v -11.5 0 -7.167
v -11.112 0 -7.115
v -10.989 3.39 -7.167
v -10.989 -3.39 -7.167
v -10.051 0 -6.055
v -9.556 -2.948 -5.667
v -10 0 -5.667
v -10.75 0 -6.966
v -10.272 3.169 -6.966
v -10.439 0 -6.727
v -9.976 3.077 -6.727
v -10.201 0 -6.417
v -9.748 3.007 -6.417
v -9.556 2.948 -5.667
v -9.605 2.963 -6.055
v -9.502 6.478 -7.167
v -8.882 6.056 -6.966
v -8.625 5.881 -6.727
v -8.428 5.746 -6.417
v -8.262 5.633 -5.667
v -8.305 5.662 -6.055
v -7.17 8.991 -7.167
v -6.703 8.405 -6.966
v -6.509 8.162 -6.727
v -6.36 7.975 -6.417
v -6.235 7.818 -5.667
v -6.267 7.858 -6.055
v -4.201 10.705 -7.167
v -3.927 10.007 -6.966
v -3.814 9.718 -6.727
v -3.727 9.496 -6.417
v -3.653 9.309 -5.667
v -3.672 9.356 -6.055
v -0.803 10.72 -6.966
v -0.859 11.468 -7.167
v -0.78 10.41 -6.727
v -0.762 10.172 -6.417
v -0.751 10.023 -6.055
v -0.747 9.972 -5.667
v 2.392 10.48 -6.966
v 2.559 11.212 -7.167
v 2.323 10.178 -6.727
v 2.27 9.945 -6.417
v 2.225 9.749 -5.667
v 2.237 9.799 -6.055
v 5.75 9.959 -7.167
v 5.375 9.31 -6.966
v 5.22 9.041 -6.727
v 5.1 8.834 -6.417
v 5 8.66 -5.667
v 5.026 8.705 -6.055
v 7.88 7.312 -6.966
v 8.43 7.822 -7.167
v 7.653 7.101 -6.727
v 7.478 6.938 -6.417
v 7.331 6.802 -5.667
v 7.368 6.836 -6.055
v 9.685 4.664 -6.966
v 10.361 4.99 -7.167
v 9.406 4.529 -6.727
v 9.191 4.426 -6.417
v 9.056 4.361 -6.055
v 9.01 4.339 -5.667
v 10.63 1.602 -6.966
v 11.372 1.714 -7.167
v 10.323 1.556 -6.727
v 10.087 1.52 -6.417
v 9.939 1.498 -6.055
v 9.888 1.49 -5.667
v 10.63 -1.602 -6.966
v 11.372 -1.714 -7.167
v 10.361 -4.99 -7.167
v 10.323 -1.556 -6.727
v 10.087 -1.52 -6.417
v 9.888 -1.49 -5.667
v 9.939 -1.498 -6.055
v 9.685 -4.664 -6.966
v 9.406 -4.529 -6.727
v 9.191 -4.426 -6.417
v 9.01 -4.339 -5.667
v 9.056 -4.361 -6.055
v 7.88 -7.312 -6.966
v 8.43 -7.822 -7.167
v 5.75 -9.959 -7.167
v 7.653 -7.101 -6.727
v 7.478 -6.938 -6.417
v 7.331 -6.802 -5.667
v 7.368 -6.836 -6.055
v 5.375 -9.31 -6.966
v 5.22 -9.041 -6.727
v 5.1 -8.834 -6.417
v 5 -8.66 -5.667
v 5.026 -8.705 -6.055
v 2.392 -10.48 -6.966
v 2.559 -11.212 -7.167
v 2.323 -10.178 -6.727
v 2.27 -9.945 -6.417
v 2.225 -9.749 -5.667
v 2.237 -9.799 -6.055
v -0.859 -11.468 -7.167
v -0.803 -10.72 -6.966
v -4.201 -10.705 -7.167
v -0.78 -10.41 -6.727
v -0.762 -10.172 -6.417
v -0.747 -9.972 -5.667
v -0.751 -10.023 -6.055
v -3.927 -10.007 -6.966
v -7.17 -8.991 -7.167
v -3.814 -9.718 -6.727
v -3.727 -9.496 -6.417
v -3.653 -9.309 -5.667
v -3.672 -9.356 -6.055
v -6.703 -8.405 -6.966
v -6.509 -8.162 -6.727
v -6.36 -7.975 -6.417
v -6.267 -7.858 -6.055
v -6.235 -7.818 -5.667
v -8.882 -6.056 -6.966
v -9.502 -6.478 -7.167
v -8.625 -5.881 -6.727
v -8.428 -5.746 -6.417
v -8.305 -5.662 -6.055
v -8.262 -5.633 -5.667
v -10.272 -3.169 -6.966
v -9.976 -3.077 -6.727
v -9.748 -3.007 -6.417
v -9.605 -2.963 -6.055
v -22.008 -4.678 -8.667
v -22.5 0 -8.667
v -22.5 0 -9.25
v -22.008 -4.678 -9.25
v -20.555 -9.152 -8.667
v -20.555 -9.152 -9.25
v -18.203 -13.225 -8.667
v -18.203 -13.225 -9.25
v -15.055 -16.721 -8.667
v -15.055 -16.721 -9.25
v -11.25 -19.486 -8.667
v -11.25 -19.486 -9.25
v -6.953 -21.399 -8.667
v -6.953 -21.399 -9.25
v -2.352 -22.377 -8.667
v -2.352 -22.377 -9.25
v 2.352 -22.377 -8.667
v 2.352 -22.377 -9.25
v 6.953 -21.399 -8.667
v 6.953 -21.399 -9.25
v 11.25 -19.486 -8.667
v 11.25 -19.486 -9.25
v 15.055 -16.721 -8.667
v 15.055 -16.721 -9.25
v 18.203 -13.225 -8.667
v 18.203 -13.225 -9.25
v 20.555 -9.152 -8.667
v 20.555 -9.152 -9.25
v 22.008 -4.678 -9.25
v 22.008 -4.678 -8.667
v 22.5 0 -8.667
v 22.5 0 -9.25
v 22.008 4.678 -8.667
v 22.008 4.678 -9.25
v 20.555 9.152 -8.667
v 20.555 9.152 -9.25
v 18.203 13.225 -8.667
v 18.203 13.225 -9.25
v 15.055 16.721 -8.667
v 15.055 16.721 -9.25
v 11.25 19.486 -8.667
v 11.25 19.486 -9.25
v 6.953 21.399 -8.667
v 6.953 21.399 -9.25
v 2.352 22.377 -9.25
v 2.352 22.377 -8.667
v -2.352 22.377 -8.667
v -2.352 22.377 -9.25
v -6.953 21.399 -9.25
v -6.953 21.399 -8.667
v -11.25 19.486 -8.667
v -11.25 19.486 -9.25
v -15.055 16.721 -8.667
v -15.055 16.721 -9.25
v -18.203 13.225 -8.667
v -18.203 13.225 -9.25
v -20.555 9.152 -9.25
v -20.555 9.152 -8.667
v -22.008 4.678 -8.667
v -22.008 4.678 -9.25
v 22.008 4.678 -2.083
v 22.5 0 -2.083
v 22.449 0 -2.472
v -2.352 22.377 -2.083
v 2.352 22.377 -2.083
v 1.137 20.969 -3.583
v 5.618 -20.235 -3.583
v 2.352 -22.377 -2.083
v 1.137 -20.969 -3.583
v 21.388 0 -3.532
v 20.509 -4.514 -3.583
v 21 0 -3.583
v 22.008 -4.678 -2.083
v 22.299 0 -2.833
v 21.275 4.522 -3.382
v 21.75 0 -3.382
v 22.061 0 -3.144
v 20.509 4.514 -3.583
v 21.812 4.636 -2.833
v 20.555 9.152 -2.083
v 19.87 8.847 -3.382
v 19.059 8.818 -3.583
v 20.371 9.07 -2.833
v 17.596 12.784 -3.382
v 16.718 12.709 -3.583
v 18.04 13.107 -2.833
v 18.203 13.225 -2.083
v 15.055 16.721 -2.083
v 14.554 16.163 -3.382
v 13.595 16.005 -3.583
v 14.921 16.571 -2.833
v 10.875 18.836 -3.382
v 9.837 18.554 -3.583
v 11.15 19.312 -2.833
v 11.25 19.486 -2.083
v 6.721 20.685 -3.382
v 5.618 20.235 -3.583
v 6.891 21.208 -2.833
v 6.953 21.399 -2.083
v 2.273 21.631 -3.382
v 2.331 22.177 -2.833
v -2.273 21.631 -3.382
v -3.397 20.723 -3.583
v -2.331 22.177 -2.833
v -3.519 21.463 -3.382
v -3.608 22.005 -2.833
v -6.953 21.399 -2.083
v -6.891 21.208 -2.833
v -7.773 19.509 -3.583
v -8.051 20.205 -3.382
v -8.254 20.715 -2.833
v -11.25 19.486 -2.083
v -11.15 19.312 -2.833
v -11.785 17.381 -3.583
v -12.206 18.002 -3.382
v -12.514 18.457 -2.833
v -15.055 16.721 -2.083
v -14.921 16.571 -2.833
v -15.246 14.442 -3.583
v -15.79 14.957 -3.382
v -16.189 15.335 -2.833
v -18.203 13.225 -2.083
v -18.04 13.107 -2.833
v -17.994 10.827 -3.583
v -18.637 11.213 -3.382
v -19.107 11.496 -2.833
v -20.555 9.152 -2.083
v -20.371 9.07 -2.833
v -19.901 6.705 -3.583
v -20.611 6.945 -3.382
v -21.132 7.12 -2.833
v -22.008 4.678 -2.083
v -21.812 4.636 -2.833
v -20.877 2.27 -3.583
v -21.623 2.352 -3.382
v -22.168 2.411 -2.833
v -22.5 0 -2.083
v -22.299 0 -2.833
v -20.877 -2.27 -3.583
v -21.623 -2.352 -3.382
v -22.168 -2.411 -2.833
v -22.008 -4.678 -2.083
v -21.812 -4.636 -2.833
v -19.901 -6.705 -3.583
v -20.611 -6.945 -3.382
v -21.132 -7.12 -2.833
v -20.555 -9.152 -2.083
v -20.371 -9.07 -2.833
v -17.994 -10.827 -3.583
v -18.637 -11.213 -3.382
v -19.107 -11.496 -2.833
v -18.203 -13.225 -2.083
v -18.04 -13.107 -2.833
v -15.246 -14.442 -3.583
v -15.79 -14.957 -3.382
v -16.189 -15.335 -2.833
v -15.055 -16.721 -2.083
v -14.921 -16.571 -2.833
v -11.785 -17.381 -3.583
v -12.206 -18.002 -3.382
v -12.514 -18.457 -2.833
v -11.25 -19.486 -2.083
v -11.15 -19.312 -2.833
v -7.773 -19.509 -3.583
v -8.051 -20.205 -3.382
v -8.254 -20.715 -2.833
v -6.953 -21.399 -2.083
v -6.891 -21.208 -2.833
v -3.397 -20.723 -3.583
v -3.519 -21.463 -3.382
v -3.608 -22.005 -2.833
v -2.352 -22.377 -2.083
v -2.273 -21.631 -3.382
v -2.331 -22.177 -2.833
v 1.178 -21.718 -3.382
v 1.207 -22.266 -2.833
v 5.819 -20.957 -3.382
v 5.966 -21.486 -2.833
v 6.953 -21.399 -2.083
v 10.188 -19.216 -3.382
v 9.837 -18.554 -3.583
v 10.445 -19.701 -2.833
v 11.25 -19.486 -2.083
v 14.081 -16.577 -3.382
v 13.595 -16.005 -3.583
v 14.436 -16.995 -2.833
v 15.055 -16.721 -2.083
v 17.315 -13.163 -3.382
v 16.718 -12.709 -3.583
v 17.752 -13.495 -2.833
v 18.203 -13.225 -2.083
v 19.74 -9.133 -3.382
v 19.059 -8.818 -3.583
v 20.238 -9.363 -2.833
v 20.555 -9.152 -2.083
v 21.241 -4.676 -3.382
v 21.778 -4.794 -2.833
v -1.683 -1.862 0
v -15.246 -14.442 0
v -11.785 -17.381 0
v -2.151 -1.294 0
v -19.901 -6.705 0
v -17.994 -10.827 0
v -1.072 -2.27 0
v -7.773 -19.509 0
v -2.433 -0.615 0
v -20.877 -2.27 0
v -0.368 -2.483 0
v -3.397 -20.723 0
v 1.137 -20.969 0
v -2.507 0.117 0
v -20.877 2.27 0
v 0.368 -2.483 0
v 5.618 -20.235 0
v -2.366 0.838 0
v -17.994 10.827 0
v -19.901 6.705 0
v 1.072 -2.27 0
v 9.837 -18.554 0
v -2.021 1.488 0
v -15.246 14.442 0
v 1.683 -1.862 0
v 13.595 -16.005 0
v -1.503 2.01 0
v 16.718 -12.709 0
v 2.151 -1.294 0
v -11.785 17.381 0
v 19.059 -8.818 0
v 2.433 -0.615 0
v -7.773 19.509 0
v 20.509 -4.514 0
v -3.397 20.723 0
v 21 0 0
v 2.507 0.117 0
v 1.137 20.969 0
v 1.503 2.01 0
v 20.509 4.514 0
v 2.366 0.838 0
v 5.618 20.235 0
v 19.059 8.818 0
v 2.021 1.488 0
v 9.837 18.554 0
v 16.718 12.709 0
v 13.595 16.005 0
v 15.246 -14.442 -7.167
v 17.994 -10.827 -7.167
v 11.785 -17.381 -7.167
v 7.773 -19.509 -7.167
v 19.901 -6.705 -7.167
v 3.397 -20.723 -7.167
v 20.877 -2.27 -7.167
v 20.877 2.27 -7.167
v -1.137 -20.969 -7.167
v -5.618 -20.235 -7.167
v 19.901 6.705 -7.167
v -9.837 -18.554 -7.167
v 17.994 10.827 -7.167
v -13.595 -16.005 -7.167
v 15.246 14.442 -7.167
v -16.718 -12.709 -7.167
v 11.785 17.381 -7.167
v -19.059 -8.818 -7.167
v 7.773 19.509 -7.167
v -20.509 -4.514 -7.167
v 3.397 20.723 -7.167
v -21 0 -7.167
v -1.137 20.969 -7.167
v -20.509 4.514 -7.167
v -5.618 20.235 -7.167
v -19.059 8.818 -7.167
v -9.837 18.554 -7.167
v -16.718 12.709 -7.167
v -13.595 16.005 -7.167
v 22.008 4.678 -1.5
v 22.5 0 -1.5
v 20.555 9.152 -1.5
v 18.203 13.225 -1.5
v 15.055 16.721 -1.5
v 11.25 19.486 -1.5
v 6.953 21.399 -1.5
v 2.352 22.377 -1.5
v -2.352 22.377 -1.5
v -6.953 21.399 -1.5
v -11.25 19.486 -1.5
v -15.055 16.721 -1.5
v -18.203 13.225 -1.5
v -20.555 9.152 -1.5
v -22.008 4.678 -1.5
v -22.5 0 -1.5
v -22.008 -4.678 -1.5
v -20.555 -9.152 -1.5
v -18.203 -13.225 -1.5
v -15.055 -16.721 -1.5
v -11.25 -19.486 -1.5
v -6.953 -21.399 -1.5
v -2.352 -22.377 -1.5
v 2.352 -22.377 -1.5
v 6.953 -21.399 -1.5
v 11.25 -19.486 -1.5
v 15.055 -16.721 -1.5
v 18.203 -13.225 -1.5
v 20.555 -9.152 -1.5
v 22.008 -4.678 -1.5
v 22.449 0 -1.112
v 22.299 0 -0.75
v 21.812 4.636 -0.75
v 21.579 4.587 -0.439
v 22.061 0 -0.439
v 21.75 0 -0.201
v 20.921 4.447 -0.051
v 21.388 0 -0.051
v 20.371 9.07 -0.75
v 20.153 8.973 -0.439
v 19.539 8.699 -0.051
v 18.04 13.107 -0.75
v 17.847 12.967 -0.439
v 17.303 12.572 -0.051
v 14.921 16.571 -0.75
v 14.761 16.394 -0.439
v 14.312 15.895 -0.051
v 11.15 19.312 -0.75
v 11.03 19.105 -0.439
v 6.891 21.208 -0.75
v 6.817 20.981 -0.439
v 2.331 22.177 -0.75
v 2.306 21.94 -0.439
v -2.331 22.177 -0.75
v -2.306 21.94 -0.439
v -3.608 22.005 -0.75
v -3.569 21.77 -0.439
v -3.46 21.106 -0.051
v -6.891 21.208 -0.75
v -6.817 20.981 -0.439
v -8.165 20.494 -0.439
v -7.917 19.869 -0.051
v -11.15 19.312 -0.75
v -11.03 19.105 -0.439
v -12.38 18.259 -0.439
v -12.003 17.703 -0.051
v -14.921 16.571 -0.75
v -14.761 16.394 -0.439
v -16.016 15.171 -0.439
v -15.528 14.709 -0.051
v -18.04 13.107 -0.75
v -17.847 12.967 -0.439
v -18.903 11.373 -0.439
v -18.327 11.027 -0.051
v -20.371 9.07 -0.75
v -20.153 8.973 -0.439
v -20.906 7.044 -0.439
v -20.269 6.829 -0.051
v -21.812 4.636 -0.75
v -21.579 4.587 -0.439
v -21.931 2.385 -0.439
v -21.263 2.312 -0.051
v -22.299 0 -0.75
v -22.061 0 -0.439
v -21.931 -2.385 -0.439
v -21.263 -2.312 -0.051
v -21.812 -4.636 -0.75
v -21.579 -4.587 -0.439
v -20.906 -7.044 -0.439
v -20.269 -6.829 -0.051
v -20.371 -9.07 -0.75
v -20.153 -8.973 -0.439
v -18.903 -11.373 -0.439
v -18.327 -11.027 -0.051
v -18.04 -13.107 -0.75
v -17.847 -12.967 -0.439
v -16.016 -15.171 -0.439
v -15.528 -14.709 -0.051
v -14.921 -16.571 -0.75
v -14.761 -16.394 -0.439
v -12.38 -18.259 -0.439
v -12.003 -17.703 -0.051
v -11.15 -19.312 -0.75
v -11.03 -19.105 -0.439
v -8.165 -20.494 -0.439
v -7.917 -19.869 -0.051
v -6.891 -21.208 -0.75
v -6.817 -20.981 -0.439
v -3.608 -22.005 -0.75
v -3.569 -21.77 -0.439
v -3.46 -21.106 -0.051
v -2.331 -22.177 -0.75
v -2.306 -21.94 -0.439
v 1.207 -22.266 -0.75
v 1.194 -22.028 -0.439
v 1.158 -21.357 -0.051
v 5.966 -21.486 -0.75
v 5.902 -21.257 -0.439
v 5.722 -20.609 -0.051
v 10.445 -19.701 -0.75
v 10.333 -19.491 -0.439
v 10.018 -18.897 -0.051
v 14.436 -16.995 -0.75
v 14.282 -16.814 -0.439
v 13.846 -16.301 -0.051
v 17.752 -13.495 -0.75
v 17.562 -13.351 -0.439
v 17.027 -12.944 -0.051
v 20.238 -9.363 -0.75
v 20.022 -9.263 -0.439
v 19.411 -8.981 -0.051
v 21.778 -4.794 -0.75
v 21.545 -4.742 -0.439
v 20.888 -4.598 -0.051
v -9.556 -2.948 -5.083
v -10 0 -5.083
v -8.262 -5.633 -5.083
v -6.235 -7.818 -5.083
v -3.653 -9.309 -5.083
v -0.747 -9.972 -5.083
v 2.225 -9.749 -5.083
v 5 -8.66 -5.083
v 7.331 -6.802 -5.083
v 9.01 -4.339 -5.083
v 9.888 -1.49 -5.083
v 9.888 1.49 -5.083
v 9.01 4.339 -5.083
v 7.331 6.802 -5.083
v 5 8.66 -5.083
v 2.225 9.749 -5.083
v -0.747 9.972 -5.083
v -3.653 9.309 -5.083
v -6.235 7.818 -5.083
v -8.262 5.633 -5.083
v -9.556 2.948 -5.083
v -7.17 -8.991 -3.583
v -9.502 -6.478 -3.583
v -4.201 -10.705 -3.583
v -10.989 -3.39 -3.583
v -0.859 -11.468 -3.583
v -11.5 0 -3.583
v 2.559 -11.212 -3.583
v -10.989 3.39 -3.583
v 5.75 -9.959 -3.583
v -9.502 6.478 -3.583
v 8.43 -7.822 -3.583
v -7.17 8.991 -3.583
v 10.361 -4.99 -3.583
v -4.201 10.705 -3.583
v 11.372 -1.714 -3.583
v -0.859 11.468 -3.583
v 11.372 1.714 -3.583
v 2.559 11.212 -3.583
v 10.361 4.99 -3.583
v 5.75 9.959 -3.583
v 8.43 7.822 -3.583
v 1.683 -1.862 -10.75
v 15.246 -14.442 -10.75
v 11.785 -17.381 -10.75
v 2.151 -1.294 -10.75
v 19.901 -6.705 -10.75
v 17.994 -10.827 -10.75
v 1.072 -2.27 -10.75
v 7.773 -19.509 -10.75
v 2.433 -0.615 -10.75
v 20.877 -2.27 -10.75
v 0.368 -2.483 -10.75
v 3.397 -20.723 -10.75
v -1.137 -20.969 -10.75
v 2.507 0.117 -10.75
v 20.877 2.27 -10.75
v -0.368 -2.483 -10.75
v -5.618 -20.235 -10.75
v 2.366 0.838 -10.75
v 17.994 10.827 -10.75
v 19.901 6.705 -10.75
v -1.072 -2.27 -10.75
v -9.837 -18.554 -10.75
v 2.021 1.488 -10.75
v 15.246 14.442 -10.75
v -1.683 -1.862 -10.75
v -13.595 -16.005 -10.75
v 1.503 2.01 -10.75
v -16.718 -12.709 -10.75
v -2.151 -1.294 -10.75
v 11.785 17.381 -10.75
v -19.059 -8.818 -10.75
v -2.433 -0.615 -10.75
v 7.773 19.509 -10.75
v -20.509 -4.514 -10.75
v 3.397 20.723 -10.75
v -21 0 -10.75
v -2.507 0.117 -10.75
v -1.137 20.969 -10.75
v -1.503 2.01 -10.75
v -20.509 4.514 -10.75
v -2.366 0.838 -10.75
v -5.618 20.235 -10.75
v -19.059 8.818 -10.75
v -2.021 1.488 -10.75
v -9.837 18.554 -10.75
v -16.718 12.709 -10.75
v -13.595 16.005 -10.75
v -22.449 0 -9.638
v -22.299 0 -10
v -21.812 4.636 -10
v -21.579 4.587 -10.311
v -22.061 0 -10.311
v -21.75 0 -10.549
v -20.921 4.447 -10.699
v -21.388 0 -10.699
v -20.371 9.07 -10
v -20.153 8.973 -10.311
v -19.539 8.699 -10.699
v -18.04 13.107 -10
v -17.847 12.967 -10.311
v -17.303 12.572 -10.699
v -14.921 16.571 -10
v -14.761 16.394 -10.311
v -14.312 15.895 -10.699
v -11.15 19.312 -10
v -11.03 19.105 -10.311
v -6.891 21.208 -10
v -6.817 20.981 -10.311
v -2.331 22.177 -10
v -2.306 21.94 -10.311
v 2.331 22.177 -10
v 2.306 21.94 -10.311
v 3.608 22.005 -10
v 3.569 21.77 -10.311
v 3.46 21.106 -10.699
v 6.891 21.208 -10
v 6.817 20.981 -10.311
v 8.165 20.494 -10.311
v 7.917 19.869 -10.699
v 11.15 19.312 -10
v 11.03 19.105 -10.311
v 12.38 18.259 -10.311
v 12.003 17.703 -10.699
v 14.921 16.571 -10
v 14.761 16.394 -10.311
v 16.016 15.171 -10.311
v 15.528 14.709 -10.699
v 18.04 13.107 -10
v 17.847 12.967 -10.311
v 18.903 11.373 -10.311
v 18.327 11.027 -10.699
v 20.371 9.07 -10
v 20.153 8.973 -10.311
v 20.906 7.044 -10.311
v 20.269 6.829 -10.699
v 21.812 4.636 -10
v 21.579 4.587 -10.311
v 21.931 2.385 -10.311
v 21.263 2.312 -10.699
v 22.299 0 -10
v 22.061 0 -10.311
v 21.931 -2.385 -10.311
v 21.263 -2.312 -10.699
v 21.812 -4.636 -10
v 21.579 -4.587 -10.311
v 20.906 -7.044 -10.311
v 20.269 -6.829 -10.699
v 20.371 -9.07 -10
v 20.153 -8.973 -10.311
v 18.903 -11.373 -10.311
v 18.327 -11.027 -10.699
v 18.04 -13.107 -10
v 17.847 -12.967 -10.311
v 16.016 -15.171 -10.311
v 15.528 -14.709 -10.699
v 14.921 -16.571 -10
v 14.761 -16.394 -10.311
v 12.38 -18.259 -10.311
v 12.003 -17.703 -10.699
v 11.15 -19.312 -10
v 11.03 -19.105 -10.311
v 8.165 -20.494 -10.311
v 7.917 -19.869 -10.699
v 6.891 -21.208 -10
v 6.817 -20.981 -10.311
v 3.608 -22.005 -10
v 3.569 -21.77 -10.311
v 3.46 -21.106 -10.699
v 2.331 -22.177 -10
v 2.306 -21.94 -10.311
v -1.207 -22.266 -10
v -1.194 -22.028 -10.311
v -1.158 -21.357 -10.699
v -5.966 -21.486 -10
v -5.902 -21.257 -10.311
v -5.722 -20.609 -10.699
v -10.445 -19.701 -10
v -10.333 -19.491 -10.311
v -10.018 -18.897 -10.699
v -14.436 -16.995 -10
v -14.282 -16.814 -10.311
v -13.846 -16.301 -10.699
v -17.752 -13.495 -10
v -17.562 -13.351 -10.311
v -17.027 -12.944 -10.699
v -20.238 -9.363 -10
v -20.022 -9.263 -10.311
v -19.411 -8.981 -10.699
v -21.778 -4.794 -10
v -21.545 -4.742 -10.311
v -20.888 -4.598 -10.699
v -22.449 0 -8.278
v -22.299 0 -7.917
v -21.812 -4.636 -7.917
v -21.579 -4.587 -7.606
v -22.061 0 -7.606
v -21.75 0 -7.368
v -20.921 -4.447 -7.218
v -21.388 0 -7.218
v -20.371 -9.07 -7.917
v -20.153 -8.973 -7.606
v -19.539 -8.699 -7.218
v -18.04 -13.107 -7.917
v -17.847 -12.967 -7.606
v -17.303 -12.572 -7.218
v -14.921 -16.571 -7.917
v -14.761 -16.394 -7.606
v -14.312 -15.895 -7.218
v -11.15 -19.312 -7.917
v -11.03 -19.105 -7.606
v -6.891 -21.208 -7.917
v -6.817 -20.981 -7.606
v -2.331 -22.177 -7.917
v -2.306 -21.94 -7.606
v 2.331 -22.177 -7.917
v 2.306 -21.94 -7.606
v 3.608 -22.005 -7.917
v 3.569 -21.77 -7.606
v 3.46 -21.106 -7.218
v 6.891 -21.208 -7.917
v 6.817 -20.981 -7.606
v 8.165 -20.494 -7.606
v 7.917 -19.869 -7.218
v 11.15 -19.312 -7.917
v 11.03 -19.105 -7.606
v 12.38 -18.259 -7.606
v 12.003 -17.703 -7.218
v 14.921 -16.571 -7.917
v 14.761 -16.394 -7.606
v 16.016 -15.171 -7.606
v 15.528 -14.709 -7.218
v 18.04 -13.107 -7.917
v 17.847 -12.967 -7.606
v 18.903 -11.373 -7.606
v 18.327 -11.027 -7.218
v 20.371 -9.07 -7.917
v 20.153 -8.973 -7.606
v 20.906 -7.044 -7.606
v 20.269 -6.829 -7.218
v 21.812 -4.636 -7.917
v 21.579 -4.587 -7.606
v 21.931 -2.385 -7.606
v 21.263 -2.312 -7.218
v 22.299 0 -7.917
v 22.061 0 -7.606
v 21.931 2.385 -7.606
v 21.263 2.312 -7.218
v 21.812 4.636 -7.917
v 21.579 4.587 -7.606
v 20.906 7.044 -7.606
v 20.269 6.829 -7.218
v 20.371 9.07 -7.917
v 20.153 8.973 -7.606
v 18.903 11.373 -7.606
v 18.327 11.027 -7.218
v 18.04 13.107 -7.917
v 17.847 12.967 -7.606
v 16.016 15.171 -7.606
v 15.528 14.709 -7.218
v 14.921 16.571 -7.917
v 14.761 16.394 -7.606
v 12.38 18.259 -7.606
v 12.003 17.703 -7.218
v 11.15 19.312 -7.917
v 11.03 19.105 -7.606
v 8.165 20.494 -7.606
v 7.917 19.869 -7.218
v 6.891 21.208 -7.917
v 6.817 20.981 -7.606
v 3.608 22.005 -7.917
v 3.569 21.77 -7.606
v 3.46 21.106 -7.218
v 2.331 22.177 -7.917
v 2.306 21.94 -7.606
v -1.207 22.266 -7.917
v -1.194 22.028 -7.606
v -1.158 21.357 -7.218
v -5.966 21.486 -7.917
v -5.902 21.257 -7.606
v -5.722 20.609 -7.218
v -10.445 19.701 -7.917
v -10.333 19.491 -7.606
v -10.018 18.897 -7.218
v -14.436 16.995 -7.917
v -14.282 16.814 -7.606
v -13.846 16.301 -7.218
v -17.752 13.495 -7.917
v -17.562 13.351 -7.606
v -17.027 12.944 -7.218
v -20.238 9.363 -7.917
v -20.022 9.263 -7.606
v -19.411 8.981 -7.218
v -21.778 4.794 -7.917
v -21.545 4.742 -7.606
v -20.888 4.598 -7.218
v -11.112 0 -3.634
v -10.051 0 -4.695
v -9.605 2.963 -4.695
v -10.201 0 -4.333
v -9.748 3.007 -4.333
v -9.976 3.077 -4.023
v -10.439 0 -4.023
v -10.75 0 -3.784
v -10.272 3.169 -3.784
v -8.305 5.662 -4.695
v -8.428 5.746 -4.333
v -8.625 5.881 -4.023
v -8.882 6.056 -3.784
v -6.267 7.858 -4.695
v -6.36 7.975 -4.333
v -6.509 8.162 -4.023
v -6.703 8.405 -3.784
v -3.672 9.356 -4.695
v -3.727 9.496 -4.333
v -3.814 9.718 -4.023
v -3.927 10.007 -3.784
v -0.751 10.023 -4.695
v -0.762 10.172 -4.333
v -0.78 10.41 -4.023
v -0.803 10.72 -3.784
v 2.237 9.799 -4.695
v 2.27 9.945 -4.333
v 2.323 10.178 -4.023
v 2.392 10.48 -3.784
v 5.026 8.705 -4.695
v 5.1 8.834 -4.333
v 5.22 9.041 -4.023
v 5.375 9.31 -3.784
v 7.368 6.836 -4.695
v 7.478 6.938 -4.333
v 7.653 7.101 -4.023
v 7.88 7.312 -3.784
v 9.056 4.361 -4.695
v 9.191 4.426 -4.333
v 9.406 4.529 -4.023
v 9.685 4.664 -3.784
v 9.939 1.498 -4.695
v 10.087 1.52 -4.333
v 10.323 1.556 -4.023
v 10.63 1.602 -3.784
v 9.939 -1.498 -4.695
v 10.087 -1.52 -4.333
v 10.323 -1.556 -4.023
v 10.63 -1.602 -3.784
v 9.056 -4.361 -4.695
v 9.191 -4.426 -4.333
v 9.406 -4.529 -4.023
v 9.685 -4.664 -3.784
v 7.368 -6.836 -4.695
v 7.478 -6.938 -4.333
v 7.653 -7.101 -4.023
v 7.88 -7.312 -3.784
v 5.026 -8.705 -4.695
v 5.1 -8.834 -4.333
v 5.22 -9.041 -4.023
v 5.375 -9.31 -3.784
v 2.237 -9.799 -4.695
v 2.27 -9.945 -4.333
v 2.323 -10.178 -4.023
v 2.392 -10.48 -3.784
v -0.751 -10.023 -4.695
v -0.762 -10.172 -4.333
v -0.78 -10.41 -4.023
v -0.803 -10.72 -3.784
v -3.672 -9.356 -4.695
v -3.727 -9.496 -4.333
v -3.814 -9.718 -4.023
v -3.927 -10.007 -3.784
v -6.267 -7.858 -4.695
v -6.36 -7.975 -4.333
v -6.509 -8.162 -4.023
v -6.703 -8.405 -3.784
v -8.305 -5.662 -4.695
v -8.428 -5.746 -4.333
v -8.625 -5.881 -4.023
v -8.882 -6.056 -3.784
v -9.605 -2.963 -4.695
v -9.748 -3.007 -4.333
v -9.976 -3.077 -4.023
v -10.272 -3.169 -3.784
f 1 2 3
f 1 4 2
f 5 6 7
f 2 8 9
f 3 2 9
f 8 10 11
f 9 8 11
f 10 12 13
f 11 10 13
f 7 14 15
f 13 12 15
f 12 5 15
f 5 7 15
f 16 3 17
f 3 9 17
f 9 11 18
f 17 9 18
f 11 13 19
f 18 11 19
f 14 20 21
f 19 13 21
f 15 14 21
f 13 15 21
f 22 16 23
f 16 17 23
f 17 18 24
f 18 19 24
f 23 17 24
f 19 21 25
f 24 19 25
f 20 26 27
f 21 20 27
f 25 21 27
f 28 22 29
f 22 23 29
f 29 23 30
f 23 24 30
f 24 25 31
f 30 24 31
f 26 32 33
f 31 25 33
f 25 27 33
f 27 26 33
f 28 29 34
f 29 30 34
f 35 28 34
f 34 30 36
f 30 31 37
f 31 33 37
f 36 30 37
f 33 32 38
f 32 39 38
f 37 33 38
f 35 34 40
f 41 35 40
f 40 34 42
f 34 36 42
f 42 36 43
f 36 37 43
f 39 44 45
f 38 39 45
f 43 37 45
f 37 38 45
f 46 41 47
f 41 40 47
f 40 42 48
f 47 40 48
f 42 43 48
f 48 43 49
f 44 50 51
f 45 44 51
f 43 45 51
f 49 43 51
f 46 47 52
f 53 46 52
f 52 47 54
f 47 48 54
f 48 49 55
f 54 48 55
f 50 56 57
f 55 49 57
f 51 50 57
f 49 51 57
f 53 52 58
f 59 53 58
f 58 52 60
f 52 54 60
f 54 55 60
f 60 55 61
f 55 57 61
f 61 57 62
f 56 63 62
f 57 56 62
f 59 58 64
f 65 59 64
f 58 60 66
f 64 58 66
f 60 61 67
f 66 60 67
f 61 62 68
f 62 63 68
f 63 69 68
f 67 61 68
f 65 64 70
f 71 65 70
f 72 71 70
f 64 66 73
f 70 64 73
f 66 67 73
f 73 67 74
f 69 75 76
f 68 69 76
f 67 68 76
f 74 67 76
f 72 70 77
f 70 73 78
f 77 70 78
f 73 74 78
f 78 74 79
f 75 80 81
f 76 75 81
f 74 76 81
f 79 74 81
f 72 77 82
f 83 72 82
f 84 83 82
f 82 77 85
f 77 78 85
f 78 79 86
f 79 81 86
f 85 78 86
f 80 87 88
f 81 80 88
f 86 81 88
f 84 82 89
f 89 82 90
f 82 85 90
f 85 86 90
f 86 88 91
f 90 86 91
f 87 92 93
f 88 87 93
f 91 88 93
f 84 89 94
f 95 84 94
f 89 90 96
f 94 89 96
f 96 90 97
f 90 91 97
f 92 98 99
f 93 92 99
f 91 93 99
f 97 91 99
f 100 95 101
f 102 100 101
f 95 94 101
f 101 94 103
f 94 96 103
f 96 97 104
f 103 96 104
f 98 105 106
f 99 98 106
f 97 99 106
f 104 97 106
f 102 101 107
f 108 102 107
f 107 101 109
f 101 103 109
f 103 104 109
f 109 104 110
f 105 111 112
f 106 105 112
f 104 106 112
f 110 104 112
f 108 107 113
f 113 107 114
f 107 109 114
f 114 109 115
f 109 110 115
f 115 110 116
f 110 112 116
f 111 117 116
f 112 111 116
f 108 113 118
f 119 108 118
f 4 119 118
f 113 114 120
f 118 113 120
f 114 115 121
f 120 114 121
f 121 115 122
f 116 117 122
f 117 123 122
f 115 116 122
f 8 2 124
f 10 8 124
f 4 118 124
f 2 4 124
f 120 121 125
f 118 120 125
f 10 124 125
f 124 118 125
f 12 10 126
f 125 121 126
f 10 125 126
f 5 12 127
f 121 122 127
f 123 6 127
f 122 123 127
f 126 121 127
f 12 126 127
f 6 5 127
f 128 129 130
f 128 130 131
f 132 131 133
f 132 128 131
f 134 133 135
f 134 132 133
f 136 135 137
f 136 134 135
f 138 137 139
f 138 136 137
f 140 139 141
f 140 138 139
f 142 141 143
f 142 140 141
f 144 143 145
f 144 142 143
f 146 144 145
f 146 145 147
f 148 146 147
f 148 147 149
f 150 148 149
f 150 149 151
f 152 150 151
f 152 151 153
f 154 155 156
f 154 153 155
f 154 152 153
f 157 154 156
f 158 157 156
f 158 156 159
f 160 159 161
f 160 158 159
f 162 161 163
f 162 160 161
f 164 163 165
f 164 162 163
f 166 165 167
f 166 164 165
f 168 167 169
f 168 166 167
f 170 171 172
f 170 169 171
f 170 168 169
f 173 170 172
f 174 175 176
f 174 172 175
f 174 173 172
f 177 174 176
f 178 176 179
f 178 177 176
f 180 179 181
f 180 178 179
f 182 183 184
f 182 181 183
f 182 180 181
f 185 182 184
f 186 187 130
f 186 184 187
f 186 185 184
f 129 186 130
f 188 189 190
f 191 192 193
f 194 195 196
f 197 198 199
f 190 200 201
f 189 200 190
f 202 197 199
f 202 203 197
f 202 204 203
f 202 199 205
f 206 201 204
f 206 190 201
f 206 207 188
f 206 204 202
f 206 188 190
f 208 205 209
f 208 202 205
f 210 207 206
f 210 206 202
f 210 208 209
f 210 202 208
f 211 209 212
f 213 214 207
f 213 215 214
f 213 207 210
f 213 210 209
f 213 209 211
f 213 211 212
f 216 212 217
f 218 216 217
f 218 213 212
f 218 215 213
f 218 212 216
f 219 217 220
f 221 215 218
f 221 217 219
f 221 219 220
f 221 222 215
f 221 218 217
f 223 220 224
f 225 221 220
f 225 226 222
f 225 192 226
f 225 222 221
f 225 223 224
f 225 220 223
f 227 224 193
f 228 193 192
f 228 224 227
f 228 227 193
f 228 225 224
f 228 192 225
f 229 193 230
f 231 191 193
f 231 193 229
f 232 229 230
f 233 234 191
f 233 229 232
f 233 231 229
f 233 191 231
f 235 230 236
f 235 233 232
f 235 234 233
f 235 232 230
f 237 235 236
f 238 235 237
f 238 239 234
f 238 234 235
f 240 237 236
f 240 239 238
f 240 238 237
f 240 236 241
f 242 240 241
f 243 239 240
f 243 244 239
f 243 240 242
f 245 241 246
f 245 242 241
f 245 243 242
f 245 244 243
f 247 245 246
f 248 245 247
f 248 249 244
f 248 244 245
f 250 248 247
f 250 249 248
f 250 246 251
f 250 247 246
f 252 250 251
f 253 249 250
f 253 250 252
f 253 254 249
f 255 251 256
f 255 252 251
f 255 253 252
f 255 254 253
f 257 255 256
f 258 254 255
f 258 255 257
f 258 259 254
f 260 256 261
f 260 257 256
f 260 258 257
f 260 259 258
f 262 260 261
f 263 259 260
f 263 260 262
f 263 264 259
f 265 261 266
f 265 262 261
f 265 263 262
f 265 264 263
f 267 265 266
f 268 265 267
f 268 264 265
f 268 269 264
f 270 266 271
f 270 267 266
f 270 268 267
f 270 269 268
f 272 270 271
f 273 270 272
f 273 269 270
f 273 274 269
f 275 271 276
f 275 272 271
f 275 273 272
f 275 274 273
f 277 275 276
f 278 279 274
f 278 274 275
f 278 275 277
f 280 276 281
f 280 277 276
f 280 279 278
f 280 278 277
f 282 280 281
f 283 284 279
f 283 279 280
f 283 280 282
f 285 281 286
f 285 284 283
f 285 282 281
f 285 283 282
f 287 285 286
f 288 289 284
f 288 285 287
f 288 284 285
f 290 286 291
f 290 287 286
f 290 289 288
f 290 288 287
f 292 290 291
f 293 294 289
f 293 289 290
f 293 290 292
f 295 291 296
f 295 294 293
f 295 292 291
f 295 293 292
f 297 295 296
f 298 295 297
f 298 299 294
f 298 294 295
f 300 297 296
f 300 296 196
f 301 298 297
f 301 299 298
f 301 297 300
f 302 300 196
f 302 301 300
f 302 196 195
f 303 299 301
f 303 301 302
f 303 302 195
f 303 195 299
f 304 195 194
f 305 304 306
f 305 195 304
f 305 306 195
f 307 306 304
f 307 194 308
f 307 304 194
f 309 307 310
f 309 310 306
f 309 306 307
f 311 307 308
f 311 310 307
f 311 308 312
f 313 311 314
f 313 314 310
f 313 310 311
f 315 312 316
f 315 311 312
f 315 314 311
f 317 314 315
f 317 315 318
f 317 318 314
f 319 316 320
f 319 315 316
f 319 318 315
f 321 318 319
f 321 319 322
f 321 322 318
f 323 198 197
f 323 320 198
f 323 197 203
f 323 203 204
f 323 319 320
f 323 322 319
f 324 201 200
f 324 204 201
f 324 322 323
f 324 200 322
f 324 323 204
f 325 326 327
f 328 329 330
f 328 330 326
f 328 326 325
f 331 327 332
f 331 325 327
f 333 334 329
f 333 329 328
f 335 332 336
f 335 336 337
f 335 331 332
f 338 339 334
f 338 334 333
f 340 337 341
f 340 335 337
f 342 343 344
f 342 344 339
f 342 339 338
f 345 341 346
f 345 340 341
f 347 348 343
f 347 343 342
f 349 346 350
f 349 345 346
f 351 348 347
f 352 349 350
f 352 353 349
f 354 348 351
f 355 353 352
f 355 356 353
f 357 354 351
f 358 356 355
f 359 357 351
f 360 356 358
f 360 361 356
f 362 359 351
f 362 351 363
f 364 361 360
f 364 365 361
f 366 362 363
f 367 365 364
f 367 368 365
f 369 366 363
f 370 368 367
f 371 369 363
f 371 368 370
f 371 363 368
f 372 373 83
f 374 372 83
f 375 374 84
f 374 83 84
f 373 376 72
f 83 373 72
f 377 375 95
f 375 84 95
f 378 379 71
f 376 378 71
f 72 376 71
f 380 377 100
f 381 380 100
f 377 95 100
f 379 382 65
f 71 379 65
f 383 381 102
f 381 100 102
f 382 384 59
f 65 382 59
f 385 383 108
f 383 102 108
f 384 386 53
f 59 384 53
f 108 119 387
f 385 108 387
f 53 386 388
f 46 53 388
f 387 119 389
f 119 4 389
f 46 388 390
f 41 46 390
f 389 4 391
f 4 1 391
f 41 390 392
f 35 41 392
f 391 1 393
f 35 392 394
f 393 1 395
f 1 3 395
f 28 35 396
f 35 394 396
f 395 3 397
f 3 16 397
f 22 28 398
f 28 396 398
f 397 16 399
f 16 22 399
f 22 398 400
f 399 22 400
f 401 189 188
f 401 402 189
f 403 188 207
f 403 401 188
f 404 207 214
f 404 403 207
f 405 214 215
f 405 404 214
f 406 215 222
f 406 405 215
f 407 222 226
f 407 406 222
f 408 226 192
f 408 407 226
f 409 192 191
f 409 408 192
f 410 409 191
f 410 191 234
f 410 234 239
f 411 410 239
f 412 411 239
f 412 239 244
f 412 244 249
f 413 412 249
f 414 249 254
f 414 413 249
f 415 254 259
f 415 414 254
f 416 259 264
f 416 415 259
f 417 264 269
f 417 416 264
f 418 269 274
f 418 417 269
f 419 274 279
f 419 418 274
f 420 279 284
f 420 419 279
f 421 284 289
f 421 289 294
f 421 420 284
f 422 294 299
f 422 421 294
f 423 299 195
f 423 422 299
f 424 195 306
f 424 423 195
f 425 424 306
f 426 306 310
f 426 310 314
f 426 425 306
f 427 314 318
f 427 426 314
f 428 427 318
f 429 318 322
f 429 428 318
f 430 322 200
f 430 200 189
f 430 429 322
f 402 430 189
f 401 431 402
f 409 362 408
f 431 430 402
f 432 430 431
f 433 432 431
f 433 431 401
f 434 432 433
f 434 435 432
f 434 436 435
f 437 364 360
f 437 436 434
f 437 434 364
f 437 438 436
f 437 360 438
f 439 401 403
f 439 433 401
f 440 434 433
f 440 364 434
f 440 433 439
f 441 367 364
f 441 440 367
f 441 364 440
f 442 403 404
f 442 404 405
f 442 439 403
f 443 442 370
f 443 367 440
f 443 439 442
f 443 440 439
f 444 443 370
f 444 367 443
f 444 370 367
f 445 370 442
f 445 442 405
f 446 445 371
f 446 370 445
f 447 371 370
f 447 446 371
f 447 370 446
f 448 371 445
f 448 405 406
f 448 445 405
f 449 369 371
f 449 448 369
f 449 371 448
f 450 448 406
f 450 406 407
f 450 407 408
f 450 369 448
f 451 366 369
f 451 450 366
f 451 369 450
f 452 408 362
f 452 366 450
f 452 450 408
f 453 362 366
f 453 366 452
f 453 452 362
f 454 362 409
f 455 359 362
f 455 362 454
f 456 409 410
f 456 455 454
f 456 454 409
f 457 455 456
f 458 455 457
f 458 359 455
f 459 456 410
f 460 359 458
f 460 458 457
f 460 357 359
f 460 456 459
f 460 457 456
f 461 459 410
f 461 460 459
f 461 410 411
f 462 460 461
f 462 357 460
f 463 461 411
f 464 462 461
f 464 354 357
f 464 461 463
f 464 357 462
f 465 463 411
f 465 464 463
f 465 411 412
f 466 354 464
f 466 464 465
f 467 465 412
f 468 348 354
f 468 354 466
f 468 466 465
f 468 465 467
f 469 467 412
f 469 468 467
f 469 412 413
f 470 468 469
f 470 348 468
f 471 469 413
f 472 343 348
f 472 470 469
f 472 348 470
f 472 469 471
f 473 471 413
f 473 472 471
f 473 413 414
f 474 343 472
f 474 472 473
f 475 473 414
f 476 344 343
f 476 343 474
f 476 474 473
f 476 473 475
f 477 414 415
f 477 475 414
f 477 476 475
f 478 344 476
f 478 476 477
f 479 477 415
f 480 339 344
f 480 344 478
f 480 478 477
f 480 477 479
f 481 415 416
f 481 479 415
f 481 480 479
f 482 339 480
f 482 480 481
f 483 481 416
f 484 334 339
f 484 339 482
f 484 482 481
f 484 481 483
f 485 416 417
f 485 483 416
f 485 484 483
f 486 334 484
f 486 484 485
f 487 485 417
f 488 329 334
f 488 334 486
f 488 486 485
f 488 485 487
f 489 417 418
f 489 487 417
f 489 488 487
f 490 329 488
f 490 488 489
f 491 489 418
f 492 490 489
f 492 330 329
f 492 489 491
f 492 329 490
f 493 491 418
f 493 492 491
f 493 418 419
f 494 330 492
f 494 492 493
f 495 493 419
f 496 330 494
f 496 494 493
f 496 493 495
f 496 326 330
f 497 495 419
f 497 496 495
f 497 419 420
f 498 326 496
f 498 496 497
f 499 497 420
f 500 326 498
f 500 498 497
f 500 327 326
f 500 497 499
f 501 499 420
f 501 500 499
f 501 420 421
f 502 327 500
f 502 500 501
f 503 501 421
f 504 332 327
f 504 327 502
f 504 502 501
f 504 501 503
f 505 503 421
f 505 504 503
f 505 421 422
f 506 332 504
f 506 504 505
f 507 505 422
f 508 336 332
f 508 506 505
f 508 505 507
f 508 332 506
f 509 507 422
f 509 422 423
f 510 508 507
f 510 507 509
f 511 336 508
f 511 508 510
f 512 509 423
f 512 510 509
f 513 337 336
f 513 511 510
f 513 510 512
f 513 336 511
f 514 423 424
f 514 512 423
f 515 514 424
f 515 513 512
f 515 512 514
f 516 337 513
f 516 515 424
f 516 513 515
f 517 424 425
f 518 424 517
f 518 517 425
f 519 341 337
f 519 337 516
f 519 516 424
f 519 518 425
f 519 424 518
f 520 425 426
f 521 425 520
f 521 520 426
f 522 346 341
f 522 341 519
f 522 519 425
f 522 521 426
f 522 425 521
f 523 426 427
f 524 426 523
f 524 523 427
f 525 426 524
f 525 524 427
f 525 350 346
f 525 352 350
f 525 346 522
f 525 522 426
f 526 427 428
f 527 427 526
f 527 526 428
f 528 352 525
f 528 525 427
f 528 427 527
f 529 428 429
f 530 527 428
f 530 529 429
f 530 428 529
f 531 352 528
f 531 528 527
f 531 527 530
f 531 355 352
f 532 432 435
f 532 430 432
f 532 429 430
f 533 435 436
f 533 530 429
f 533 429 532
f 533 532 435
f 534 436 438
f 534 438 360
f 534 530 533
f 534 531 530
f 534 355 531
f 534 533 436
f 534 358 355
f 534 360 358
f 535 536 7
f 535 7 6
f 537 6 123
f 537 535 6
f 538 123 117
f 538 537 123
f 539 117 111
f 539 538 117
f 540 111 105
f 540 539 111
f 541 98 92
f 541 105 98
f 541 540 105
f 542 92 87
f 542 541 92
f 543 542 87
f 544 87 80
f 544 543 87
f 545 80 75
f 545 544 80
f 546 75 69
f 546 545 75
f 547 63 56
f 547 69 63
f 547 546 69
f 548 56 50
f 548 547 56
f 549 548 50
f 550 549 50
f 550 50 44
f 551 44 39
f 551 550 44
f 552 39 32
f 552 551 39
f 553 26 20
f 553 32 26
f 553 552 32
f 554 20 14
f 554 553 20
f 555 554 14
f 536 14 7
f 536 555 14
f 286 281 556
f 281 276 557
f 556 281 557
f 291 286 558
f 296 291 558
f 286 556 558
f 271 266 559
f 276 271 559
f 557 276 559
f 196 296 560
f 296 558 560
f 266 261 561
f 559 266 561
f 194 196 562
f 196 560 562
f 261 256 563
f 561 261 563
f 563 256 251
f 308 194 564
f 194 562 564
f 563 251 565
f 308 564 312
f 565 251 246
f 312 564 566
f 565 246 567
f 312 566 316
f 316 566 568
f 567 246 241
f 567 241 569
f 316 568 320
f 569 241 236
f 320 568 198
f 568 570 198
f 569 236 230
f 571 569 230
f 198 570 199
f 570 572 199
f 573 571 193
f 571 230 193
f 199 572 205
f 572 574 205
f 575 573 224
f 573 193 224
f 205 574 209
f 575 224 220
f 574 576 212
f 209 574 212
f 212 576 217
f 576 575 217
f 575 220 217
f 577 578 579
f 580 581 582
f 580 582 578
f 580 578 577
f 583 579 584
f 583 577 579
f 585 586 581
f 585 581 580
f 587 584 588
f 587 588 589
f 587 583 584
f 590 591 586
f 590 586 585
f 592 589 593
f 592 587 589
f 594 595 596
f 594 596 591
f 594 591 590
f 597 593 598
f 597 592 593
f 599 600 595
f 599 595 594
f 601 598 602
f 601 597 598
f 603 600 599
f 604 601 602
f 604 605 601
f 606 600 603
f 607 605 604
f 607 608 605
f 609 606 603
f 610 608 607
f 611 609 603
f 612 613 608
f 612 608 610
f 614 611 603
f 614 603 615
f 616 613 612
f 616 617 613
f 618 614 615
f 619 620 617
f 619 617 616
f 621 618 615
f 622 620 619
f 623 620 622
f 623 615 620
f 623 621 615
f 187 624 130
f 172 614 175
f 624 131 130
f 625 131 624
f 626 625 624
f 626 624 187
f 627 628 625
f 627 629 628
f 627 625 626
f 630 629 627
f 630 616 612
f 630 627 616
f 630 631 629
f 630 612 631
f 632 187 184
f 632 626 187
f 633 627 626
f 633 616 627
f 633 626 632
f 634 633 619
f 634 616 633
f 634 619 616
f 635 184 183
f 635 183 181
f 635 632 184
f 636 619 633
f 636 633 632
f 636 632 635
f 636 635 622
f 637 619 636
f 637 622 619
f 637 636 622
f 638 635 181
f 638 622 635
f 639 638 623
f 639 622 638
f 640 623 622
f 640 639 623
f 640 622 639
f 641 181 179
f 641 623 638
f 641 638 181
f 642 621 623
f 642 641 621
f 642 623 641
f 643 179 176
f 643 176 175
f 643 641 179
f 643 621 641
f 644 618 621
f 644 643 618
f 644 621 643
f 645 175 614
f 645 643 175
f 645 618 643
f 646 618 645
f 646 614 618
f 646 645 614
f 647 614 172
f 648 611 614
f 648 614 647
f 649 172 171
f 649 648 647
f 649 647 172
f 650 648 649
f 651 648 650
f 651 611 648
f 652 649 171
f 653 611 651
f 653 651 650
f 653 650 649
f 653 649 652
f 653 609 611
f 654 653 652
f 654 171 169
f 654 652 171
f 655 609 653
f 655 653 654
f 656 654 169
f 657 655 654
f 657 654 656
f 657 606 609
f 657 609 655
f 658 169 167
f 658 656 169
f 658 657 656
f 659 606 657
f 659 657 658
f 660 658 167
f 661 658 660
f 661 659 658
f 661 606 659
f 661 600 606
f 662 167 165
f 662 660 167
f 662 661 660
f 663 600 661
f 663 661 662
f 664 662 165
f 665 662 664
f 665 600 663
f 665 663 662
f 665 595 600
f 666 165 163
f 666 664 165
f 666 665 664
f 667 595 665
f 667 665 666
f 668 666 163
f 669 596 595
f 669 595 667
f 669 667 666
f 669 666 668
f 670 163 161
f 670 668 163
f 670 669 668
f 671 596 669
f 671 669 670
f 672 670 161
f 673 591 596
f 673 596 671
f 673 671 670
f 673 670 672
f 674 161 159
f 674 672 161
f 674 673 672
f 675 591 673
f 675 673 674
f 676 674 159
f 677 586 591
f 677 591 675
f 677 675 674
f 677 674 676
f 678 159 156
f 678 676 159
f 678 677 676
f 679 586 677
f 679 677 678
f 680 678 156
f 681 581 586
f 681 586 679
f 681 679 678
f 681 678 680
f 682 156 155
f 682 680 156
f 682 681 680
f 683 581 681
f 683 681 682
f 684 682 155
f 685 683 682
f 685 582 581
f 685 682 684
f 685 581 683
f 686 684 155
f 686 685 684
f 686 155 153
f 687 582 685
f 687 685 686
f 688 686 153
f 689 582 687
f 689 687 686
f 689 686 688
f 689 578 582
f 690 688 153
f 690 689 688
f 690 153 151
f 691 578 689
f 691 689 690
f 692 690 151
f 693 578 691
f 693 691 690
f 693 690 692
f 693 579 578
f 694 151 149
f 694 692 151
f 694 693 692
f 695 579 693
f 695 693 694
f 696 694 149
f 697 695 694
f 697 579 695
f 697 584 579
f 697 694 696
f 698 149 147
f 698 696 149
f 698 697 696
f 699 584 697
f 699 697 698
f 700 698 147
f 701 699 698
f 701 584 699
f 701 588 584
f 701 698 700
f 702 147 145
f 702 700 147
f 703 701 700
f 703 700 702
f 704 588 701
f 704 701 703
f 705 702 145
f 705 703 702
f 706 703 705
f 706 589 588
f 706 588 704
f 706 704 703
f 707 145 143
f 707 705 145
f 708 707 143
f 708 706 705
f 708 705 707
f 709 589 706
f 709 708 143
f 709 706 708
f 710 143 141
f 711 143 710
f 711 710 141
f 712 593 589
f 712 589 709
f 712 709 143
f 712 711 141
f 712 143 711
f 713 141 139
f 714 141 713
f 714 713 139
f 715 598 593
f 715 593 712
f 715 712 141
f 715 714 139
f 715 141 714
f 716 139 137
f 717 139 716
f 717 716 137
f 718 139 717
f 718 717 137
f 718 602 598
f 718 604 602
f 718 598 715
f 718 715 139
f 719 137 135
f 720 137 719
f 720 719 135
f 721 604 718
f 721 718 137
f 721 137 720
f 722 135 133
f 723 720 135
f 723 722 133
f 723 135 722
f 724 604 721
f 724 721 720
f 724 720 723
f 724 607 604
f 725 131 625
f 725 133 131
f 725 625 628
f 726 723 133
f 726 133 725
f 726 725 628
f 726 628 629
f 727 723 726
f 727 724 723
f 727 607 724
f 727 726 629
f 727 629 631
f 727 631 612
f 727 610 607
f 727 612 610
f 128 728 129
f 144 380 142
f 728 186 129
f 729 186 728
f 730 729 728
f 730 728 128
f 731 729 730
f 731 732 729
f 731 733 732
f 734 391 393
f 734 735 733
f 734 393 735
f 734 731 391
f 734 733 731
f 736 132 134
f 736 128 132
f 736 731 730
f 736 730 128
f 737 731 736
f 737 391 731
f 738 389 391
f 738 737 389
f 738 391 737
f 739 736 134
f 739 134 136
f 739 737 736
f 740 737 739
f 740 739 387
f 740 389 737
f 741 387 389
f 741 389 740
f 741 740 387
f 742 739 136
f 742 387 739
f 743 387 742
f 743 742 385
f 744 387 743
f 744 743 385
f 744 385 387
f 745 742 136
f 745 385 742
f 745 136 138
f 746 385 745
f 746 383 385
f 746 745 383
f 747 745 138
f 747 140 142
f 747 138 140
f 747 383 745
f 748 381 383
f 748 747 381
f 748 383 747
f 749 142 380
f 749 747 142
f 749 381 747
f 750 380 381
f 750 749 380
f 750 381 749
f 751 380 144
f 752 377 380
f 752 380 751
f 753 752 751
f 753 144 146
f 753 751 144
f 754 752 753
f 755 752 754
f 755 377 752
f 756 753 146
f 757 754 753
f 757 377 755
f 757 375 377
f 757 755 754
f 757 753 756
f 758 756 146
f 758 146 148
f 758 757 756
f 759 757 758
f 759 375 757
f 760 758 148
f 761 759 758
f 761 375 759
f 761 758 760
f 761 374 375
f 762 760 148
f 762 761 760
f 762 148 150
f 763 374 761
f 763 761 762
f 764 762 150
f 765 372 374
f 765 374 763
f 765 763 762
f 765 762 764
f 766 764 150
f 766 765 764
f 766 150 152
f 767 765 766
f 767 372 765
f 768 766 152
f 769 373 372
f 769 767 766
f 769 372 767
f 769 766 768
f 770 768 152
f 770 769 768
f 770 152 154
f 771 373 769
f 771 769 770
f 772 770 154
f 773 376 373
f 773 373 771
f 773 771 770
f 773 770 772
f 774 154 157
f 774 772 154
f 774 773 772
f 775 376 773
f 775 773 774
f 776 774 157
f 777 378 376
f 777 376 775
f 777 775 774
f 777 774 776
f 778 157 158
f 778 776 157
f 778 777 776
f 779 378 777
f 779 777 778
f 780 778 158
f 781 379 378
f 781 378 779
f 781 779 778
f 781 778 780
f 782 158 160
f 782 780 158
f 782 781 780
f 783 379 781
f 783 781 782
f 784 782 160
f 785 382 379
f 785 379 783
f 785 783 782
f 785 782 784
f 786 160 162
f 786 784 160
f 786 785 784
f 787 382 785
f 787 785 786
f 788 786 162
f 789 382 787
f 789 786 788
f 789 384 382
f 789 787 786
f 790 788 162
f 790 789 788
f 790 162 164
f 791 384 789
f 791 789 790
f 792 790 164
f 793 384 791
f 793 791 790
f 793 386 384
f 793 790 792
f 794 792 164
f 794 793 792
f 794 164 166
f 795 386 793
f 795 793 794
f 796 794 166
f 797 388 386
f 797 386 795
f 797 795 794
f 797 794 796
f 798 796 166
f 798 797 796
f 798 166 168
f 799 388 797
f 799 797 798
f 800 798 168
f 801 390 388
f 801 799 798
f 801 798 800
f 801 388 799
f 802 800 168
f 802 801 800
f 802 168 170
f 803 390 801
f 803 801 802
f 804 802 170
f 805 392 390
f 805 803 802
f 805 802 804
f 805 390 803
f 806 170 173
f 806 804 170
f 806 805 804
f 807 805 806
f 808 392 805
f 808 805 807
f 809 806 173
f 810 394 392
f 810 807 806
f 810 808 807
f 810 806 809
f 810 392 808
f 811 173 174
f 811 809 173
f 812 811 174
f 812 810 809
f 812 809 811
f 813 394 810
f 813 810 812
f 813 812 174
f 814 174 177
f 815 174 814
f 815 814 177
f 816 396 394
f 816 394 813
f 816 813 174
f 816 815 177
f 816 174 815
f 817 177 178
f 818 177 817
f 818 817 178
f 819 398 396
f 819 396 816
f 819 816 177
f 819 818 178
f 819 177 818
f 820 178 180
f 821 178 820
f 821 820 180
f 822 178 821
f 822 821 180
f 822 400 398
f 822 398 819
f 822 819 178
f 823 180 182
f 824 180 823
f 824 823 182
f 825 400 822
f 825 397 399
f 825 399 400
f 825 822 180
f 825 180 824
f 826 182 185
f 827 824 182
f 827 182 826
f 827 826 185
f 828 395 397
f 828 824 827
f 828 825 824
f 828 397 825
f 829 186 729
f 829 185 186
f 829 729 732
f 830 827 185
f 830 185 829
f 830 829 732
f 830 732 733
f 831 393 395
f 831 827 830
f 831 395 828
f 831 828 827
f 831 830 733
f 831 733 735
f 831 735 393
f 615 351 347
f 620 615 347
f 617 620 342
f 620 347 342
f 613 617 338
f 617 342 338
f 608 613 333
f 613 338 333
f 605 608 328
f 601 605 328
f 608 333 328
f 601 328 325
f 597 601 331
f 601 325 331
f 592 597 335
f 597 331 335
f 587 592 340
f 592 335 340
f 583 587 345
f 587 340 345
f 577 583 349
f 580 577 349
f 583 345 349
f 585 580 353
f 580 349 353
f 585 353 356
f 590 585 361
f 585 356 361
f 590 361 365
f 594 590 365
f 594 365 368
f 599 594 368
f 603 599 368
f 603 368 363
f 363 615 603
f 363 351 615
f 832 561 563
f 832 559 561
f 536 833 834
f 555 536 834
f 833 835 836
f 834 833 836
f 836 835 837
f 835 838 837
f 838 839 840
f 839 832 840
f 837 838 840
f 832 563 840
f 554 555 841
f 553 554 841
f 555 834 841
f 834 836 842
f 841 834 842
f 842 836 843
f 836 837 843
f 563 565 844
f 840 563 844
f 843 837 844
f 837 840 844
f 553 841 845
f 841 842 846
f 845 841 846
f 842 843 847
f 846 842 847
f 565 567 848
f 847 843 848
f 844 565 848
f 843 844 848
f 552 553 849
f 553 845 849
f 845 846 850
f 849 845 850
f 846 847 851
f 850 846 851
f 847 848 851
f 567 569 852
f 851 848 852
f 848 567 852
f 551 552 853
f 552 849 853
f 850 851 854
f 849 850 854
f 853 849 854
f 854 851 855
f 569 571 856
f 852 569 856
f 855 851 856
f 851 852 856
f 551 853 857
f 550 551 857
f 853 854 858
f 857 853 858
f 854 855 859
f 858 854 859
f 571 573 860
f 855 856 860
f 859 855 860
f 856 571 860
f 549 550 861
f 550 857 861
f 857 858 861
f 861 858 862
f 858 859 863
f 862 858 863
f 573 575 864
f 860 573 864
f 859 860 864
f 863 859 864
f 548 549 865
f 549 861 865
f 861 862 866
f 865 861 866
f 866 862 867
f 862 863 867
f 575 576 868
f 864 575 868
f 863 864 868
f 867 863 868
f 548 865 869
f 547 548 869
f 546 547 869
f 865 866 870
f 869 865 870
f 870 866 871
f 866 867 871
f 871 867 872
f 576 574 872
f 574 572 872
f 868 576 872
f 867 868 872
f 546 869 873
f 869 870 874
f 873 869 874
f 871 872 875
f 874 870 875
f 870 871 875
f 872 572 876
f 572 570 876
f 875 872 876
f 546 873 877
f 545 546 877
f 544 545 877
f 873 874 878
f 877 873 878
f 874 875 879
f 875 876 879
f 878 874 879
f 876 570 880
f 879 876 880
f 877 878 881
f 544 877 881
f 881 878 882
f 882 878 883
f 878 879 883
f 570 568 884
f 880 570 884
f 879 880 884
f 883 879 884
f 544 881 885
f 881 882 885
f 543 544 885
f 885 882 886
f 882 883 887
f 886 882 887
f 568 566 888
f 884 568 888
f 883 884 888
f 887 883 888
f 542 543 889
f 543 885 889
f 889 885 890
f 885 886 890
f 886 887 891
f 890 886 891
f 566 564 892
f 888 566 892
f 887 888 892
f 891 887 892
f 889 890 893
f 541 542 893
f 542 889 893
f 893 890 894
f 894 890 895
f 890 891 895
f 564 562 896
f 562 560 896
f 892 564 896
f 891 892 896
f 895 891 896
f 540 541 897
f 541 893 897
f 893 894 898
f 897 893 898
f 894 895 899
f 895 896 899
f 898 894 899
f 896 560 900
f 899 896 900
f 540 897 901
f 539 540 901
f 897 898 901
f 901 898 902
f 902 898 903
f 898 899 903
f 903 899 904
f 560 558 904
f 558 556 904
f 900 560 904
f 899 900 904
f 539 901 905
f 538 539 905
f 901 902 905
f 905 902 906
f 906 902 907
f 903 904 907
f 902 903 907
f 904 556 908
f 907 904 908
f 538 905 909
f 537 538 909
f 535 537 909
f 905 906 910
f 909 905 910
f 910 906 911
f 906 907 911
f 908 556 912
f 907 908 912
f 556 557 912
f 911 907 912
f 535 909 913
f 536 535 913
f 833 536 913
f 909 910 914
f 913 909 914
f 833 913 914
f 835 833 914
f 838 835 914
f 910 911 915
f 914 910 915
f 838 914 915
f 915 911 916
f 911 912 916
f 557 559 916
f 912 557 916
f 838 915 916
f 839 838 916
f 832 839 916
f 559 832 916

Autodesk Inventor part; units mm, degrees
ref_plane "YZ Plane" through (0, 0, 0) normal (1, 0, 0) x (0, 1, 0)
ref_plane "XZ Plane" through (0, 0, 0) normal (0, 1, 0) x (-1, 0, 0)
ref_plane "XY Plane" through (0, 0, 0) normal (0, 0, 1) x (1, 0, 0)
sketch "Sketch1" plane through (0, 0, 0) normal (0, 0, 1) x (1, 0, 0)
  circle A0 centre (0, 0) radius 22.5
  dimension "d0" = 45
extrude "Extrusion1" add sketch "Sketch1" against normal blind 3.5833
sketch "Sketch2" plane through (0, 0, -3.5833) normal (0, 0, -1) x (-1, 0, 0)
  circle A0 centre (0, 0) radius 10
  dimension "d14" = 20
extrude "Extrusion2" add sketch "Sketch2" along normal blind 3.5833
sketch "Sketch3" plane through (0, 0, -7.1666) normal (0, 0, -1) x (-1, 0, 0)
  circle A0 centre (0, 0) radius 22.5
  dimension "d19" = 45
extrude "Extrusion3" add sketch "Sketch3" along normal blind 3.5833
fillet "Fillet2" radius 1.5 6 edges at (-22.5, 0, 0) (22.5, 0, -7.1666) (22.5, 0, -10.7499) (-22.5, 0, -3.5833) (10, 0, -7.1666) (10, 0, -3.5833)
sketch "Sketch4" plane through (0, 0, 0) normal (0, 0, 1) x (1, 0, 0)
  arc A0 (-1.5033, 2.01) -> (1.5033, 2.01) centre (0, 0) ccw
  line L0 (-1.5033, 2.01) -> (1.5033, 2.01)
  dimension "d15" = 5.02
extrude "Extrusion4" cut sketch "Sketch4" against normal through all
properties part number "Motor Spool For Door Opener Without Set Screw" material "ABS Plastic"
